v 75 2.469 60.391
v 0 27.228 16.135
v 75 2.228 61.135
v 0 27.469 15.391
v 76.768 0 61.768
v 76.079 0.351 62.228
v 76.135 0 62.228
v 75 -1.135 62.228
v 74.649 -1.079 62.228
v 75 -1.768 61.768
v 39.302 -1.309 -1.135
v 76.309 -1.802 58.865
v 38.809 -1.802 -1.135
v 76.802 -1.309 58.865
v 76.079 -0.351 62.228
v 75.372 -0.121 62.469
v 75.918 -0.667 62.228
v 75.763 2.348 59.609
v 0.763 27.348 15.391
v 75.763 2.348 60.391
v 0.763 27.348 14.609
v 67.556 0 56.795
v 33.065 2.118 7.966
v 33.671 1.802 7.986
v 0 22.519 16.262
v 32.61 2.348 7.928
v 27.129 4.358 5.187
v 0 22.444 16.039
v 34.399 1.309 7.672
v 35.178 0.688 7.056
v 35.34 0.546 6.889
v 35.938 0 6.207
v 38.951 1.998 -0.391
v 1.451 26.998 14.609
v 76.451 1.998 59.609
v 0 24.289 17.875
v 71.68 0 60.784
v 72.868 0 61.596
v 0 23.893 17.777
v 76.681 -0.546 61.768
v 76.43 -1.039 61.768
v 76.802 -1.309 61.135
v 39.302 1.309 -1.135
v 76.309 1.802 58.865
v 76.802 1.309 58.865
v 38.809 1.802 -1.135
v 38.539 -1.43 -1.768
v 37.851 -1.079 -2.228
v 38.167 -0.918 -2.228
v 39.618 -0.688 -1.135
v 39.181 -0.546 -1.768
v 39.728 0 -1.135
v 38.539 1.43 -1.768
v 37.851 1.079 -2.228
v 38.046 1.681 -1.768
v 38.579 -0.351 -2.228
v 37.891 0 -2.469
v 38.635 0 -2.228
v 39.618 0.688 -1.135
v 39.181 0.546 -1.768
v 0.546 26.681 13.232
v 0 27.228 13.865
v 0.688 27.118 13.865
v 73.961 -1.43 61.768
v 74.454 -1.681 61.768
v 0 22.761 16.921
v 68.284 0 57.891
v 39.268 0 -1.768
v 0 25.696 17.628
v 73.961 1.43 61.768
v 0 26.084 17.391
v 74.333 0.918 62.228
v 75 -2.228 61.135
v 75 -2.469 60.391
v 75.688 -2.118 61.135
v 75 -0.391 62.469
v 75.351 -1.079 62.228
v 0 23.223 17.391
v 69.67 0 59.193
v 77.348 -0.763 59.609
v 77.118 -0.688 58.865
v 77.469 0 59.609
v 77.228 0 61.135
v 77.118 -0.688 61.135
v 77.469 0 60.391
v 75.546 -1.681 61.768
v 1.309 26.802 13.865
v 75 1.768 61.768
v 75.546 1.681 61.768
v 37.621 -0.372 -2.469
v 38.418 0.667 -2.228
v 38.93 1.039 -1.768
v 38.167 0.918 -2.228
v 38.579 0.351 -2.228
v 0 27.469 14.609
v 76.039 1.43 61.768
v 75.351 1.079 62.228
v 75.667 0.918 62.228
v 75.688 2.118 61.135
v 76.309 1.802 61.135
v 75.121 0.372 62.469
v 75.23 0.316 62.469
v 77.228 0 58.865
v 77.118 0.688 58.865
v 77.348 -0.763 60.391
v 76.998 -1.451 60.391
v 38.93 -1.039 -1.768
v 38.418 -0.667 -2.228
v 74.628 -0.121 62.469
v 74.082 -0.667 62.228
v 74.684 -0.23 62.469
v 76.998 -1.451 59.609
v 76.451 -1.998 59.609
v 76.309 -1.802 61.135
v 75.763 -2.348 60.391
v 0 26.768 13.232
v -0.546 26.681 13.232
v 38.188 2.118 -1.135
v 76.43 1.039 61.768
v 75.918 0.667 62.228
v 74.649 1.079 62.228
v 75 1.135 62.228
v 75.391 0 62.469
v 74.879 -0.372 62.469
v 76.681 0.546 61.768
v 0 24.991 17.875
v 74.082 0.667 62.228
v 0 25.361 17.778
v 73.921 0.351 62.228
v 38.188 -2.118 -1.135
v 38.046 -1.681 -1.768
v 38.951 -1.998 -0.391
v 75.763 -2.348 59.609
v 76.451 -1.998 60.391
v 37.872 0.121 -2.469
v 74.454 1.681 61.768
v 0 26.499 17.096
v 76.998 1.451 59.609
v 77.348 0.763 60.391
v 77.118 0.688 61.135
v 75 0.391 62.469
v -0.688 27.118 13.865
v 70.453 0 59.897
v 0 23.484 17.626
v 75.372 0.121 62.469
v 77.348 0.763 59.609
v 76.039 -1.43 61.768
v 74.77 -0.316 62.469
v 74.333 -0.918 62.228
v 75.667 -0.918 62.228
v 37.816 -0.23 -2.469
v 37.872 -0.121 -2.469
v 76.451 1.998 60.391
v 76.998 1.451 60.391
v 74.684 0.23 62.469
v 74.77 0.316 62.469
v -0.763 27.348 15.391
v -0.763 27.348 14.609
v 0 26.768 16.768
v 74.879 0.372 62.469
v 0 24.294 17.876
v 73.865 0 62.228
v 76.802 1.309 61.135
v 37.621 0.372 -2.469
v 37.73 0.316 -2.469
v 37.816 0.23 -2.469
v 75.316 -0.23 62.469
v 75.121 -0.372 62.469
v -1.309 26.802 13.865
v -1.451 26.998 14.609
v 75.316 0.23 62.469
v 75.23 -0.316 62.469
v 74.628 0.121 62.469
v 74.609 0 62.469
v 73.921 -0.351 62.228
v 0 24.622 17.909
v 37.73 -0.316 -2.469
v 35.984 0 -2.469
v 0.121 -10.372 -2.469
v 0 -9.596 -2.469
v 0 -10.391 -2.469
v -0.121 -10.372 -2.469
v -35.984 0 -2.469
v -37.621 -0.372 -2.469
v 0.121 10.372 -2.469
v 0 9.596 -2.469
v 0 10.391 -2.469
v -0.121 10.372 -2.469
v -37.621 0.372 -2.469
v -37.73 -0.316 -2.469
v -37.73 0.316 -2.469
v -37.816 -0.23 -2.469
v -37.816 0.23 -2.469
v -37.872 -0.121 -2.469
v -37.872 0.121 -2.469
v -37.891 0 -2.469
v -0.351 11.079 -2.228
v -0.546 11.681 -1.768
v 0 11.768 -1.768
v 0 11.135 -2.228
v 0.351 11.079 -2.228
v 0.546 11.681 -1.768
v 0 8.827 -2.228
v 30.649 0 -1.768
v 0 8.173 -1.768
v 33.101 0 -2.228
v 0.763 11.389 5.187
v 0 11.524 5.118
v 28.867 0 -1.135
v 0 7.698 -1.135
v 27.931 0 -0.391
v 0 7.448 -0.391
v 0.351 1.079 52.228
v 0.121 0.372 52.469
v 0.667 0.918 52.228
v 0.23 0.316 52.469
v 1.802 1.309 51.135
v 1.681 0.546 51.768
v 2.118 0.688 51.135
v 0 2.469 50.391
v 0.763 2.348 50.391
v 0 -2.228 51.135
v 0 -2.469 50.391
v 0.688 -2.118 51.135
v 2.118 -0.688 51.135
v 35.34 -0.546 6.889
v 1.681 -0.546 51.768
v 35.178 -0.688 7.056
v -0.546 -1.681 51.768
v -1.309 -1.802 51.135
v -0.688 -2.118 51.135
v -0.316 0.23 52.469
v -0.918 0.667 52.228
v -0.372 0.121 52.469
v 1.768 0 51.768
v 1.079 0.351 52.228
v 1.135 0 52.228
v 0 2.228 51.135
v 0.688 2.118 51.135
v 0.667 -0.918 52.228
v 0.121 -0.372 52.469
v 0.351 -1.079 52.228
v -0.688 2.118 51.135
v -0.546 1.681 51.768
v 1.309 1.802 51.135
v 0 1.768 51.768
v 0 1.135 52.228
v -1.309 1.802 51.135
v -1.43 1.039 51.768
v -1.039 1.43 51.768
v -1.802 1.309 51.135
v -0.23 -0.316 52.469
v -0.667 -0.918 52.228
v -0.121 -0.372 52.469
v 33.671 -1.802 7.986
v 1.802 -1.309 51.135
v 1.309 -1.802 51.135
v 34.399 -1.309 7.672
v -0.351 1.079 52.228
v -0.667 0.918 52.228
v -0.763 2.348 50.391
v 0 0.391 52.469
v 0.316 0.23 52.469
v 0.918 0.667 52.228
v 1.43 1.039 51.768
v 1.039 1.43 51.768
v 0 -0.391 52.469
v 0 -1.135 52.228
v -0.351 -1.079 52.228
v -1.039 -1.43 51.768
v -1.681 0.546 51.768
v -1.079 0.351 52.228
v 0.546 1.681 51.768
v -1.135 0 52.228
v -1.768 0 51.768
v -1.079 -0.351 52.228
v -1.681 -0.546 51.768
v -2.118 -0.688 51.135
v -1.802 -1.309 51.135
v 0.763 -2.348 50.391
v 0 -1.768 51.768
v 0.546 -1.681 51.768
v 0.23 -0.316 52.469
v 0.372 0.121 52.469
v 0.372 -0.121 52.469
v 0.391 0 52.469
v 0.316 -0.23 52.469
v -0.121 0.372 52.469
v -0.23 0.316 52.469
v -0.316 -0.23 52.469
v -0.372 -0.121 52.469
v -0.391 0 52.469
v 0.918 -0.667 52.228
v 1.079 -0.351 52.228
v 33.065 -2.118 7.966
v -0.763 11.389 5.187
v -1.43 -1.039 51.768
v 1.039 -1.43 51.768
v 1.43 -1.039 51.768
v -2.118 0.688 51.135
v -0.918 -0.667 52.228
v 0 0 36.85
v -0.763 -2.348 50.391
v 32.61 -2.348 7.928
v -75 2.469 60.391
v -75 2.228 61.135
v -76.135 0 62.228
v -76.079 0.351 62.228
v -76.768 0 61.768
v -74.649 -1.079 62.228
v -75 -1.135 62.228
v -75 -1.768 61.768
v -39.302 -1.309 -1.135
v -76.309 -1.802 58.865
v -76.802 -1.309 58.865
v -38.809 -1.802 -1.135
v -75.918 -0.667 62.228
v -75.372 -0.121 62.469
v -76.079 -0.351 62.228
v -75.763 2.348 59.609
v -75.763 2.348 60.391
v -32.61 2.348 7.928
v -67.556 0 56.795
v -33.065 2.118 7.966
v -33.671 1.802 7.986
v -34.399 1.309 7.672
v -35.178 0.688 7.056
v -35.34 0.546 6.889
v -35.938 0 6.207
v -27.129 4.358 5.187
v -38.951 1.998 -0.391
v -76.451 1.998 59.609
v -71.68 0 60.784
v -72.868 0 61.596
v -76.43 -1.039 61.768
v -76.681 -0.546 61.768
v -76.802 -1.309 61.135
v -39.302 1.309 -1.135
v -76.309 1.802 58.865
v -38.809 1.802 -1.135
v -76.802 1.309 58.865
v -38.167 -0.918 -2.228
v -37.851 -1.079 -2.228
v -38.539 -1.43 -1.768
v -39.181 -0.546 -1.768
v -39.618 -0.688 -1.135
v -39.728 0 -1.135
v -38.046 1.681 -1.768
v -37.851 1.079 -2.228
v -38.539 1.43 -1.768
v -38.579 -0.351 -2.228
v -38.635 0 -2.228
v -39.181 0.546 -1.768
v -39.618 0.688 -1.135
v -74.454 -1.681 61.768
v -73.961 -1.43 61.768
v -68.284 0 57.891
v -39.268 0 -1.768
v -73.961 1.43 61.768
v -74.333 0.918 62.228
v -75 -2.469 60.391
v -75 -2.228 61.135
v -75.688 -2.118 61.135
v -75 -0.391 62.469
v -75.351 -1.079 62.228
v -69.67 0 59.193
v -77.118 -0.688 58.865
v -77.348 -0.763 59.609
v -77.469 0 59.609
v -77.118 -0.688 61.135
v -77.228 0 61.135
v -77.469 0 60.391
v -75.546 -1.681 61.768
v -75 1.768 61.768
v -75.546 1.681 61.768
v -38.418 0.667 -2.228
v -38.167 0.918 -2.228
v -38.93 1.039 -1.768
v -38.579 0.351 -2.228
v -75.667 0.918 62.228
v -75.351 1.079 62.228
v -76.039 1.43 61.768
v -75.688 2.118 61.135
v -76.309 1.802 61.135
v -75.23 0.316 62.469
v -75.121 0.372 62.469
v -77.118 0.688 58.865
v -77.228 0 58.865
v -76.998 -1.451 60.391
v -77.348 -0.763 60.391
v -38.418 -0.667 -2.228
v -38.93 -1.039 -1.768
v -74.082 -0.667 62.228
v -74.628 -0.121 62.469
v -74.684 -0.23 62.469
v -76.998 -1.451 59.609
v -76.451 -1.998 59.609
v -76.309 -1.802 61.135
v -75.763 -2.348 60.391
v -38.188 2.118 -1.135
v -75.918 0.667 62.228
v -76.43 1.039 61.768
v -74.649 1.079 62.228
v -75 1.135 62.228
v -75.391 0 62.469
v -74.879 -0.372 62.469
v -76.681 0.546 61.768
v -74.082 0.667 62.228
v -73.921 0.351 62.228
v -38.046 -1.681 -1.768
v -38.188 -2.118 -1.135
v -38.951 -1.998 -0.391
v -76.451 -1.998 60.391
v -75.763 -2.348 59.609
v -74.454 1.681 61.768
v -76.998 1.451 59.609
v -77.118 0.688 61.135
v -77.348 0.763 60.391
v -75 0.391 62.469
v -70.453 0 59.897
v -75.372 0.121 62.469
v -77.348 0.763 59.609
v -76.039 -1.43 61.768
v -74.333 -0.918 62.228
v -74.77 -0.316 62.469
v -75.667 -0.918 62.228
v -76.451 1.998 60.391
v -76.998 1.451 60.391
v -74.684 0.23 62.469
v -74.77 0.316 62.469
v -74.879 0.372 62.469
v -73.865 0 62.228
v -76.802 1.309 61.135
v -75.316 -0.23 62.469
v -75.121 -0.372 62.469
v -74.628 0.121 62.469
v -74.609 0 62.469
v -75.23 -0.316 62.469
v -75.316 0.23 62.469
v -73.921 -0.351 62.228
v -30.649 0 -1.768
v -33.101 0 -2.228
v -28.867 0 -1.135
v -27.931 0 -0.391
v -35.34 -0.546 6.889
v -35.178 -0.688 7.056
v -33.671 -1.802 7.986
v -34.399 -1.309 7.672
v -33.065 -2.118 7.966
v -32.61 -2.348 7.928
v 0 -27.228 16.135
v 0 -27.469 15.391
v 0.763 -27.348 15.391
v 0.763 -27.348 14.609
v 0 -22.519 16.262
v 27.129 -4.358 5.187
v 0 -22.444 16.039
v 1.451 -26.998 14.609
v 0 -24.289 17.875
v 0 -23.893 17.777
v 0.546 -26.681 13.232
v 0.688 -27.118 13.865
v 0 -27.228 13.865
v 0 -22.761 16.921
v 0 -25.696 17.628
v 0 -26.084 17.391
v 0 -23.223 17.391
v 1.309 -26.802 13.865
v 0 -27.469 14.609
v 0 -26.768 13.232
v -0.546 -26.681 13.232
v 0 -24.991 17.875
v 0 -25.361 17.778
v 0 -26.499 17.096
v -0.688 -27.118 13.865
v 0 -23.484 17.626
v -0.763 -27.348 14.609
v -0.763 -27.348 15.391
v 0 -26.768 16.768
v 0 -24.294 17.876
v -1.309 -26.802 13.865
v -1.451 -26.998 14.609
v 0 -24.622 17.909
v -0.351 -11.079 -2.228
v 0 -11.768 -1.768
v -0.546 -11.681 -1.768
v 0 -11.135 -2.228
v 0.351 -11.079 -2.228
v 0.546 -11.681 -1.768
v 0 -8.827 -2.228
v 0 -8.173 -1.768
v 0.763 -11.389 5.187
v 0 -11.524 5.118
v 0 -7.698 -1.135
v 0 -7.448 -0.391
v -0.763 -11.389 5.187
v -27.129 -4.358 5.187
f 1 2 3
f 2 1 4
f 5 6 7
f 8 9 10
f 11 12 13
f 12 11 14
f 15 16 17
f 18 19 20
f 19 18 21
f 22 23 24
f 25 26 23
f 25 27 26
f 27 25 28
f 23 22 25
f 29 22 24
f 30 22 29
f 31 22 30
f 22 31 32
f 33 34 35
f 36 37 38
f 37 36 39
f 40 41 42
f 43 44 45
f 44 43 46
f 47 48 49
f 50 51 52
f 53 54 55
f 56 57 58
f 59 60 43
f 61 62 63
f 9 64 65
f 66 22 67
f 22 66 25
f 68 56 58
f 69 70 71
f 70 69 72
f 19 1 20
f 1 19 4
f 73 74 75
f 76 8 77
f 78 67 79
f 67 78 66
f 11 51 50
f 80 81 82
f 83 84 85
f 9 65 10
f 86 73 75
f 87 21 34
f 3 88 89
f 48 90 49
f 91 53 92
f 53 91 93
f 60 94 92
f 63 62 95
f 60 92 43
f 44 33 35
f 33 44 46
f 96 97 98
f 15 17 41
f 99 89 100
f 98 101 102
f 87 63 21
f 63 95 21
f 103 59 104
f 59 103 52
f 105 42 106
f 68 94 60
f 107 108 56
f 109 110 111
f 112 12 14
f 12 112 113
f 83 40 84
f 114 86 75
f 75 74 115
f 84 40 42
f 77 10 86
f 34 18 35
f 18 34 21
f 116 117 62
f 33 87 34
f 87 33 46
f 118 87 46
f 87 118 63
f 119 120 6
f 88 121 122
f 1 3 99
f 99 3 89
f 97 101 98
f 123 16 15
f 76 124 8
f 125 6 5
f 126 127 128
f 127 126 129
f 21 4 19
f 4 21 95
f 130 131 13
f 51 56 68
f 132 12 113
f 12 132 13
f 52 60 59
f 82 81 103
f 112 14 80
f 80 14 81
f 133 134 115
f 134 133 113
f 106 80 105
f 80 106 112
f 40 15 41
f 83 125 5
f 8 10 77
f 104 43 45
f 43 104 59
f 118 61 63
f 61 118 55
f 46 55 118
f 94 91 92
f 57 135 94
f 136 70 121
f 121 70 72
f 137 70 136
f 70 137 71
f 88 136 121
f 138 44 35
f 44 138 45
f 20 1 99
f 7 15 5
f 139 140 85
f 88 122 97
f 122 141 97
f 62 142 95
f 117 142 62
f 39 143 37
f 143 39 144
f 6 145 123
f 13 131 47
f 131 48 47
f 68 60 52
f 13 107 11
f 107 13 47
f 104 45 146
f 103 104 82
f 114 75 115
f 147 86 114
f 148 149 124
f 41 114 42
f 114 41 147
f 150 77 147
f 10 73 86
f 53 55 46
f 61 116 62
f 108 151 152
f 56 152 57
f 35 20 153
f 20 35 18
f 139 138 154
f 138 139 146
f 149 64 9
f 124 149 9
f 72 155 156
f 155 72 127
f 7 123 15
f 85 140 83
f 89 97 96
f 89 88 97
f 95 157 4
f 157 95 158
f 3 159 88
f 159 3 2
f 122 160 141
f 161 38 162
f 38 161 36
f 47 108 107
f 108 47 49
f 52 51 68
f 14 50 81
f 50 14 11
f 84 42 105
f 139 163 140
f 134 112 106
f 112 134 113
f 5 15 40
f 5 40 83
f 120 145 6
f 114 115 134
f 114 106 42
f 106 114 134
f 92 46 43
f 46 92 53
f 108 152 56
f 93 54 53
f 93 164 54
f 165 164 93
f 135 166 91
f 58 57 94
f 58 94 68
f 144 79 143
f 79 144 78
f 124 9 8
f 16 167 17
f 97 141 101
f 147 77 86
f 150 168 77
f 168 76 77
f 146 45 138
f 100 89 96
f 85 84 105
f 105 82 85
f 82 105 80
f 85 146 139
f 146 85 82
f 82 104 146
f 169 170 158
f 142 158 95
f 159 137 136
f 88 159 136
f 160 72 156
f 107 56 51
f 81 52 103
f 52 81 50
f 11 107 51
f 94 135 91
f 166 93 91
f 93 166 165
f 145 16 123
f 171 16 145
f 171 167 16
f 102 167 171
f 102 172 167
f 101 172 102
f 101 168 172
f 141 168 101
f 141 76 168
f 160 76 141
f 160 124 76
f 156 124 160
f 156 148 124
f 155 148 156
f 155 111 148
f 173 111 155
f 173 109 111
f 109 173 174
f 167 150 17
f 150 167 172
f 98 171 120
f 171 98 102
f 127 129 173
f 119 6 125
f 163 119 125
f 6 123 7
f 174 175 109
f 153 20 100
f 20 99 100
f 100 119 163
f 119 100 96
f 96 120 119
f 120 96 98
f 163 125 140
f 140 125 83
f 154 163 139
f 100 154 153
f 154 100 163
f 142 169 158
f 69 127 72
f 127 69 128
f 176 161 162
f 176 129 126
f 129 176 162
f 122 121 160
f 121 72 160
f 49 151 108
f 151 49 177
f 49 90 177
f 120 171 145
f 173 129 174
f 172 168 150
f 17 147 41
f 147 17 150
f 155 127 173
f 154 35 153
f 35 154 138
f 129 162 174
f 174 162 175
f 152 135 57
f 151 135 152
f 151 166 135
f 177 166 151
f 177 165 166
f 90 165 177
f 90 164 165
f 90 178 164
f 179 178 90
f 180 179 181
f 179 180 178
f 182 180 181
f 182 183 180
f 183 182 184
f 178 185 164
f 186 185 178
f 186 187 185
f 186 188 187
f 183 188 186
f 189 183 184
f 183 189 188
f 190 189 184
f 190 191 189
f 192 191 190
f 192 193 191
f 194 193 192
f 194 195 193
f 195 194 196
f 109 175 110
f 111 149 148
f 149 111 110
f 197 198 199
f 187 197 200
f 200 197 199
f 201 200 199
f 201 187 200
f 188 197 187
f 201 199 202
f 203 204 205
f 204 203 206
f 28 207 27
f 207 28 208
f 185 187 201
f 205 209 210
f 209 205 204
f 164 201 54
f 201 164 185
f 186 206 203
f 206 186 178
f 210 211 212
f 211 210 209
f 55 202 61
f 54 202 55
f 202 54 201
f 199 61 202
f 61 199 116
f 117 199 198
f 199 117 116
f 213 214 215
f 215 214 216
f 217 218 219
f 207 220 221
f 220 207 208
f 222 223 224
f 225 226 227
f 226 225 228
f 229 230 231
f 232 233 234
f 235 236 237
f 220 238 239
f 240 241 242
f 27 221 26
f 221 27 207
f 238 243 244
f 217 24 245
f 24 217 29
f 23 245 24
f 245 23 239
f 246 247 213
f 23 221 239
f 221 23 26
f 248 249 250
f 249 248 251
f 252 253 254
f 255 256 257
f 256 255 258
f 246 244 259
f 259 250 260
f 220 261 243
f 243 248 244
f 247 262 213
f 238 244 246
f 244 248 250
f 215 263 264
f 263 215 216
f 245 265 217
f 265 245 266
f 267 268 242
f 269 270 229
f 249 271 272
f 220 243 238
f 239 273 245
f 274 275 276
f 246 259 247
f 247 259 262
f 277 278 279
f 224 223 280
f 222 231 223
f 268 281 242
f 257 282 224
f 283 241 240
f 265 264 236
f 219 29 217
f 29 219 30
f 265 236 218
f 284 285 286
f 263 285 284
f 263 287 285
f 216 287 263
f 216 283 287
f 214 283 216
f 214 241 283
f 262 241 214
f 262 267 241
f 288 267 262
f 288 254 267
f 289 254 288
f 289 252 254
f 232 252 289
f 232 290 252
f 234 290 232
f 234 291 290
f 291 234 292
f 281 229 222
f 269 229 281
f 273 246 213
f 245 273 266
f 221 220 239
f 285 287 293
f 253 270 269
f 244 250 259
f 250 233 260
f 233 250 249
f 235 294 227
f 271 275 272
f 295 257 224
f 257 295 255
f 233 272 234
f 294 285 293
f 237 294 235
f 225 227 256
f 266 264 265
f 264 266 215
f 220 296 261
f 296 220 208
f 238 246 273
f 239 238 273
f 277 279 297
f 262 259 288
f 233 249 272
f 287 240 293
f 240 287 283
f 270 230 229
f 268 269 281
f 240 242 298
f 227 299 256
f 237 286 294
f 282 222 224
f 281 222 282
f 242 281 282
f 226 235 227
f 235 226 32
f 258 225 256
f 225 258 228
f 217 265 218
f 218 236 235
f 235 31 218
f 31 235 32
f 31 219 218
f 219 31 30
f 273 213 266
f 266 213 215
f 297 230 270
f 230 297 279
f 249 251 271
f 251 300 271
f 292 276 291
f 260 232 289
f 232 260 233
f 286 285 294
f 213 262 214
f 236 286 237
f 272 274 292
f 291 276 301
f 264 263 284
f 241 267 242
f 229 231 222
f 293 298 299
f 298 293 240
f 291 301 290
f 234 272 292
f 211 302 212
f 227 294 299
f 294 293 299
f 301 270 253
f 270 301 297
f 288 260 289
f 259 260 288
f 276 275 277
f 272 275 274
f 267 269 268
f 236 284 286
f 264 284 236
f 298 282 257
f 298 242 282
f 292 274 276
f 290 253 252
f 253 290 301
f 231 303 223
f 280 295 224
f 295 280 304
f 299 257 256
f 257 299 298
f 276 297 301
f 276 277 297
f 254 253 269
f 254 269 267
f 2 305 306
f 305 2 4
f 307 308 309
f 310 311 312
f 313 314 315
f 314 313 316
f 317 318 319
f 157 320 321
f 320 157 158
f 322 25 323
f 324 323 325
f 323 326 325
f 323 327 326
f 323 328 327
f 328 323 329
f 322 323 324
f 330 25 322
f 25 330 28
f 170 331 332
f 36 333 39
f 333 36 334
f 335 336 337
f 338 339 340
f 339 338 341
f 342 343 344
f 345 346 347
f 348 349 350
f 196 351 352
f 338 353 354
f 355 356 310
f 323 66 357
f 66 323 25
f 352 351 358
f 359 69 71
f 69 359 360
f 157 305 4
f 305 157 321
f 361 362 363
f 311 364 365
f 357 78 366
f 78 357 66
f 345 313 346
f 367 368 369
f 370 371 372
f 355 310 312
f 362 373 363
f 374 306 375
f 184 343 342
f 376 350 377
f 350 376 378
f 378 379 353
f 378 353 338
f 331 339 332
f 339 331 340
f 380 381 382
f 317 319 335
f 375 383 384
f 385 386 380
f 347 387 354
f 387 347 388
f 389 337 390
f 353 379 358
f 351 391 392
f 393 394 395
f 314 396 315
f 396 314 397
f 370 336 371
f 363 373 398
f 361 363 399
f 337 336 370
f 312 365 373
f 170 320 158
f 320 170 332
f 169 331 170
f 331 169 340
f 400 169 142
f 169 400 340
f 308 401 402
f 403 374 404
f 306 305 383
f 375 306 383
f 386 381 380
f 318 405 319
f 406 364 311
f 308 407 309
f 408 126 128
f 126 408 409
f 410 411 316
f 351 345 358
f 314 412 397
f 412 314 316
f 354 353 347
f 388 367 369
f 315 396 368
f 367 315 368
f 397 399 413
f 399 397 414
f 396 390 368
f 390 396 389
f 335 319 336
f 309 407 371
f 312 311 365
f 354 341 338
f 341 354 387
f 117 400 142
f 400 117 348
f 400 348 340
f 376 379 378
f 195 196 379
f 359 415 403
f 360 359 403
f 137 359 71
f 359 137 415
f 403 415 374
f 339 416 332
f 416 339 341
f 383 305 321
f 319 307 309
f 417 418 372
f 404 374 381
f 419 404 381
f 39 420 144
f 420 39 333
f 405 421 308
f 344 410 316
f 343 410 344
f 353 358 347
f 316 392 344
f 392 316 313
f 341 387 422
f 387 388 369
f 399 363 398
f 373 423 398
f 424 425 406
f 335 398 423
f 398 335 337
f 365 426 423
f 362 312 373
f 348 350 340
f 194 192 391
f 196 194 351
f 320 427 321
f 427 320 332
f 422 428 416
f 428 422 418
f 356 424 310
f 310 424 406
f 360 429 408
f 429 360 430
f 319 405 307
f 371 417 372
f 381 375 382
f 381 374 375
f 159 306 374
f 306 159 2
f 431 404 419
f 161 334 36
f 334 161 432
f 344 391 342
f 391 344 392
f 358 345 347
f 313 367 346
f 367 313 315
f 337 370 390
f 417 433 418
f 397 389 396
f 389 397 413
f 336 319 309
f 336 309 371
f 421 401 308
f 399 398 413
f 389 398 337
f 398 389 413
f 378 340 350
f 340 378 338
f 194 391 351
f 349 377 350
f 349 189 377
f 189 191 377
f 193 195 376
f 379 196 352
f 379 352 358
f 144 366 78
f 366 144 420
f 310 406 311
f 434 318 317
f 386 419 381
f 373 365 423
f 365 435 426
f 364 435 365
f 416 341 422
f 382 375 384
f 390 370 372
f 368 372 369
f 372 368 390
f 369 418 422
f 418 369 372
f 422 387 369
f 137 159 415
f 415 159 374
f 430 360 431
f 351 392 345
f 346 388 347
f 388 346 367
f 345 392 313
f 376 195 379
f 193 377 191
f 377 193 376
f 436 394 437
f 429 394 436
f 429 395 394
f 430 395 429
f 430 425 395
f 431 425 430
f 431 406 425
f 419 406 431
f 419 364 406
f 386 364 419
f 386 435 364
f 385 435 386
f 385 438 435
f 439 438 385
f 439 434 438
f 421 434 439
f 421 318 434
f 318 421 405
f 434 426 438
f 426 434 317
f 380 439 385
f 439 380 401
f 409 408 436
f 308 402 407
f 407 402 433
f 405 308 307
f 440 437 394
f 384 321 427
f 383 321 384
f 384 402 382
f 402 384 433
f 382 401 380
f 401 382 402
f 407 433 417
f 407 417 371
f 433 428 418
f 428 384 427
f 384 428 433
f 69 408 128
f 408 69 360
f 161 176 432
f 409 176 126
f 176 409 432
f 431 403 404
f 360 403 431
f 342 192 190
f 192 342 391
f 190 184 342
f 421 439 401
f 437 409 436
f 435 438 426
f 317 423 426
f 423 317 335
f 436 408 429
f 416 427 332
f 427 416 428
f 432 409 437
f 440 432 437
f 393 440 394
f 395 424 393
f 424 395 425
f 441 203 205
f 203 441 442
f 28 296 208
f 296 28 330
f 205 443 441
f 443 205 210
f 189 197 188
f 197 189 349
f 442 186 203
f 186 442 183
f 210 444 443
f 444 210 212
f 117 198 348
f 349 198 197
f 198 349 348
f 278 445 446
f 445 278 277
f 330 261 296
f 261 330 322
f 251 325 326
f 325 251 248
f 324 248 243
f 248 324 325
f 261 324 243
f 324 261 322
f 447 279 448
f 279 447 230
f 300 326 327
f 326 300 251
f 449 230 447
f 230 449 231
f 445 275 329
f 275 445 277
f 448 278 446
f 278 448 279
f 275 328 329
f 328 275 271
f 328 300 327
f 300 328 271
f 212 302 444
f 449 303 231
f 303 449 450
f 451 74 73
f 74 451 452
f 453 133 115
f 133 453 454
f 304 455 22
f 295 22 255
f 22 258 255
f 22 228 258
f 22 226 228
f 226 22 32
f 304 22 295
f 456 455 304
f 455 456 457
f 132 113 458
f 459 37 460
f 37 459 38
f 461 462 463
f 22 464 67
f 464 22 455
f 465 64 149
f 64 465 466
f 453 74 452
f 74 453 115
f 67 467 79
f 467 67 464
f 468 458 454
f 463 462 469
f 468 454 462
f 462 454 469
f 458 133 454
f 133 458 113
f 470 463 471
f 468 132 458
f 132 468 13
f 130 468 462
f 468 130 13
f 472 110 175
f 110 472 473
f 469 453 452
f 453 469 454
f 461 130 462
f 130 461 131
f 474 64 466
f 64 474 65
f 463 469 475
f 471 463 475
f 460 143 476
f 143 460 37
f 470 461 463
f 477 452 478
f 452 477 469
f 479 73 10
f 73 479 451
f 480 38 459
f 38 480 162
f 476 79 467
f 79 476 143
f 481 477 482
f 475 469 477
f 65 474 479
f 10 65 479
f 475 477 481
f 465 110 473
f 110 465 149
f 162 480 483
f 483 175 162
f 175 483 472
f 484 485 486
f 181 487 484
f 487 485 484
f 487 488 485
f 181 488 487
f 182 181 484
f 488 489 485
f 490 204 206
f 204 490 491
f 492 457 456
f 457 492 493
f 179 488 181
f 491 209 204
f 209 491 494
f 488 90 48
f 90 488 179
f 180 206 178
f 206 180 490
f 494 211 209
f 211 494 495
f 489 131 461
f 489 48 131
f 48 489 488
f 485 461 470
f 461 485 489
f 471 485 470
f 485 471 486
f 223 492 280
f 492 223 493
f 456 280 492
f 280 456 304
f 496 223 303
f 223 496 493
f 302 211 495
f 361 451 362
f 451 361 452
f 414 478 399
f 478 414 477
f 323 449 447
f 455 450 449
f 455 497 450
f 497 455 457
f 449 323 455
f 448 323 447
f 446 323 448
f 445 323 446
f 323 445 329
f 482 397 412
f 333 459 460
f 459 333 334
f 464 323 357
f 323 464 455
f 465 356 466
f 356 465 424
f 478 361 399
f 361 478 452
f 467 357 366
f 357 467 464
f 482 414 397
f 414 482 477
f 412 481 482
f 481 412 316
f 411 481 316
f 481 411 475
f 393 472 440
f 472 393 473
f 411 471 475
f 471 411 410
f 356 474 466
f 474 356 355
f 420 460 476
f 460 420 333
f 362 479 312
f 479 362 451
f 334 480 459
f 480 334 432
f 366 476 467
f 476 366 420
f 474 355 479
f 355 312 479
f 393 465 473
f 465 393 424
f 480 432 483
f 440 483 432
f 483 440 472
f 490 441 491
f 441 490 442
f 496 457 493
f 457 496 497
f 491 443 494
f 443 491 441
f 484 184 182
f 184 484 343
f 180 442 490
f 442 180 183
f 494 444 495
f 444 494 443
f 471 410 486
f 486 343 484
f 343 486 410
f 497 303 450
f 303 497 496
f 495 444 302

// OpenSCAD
/*
   origami ship

   Kit Wallace

*/
// length of bow from centre
lb=15; 
// height of bow
hb=12;
// width midships
wm=5; 
// height midships
hm=3; 
// waterline length e.g. from centre eg. half length of bow
wl=7.5; 
// width of hull from centre
wh=2; 
// height of sail
h=10; 
//Thickness of paper
thickness=1;
// sphere quality
steps = 20;
// overall scale
scale=5;


module double(axis) { 
      union() {
          children();
          mirror(axis) children();
      }
  }
module plane(s,t=0.5) {
    hull()
    for (i=[0:len(s) -1])
       translate(s[i]) sphere(t/2);     
    } 

module ground(size=50) {
   translate([0,0,-size]) cube(2*size,center=true);
}

p1=[lb,0,hb];
p2=[wl,0,0];
p3=[0,wm,hm];
p5=[0,0,h];
p4=[0,wh,0];

module ship_q(t) {
   plane([p1,p2,p3],t);
   plane([p2,p3,p4],t);
   plane([p4,p2,p5],t);
};

$fn=steps;
scale(scale) 
 difference() {
  double([0,1,0]) 
     double([1,0,0]) 
         ship_q(thickness); 
 * ground();
 }
